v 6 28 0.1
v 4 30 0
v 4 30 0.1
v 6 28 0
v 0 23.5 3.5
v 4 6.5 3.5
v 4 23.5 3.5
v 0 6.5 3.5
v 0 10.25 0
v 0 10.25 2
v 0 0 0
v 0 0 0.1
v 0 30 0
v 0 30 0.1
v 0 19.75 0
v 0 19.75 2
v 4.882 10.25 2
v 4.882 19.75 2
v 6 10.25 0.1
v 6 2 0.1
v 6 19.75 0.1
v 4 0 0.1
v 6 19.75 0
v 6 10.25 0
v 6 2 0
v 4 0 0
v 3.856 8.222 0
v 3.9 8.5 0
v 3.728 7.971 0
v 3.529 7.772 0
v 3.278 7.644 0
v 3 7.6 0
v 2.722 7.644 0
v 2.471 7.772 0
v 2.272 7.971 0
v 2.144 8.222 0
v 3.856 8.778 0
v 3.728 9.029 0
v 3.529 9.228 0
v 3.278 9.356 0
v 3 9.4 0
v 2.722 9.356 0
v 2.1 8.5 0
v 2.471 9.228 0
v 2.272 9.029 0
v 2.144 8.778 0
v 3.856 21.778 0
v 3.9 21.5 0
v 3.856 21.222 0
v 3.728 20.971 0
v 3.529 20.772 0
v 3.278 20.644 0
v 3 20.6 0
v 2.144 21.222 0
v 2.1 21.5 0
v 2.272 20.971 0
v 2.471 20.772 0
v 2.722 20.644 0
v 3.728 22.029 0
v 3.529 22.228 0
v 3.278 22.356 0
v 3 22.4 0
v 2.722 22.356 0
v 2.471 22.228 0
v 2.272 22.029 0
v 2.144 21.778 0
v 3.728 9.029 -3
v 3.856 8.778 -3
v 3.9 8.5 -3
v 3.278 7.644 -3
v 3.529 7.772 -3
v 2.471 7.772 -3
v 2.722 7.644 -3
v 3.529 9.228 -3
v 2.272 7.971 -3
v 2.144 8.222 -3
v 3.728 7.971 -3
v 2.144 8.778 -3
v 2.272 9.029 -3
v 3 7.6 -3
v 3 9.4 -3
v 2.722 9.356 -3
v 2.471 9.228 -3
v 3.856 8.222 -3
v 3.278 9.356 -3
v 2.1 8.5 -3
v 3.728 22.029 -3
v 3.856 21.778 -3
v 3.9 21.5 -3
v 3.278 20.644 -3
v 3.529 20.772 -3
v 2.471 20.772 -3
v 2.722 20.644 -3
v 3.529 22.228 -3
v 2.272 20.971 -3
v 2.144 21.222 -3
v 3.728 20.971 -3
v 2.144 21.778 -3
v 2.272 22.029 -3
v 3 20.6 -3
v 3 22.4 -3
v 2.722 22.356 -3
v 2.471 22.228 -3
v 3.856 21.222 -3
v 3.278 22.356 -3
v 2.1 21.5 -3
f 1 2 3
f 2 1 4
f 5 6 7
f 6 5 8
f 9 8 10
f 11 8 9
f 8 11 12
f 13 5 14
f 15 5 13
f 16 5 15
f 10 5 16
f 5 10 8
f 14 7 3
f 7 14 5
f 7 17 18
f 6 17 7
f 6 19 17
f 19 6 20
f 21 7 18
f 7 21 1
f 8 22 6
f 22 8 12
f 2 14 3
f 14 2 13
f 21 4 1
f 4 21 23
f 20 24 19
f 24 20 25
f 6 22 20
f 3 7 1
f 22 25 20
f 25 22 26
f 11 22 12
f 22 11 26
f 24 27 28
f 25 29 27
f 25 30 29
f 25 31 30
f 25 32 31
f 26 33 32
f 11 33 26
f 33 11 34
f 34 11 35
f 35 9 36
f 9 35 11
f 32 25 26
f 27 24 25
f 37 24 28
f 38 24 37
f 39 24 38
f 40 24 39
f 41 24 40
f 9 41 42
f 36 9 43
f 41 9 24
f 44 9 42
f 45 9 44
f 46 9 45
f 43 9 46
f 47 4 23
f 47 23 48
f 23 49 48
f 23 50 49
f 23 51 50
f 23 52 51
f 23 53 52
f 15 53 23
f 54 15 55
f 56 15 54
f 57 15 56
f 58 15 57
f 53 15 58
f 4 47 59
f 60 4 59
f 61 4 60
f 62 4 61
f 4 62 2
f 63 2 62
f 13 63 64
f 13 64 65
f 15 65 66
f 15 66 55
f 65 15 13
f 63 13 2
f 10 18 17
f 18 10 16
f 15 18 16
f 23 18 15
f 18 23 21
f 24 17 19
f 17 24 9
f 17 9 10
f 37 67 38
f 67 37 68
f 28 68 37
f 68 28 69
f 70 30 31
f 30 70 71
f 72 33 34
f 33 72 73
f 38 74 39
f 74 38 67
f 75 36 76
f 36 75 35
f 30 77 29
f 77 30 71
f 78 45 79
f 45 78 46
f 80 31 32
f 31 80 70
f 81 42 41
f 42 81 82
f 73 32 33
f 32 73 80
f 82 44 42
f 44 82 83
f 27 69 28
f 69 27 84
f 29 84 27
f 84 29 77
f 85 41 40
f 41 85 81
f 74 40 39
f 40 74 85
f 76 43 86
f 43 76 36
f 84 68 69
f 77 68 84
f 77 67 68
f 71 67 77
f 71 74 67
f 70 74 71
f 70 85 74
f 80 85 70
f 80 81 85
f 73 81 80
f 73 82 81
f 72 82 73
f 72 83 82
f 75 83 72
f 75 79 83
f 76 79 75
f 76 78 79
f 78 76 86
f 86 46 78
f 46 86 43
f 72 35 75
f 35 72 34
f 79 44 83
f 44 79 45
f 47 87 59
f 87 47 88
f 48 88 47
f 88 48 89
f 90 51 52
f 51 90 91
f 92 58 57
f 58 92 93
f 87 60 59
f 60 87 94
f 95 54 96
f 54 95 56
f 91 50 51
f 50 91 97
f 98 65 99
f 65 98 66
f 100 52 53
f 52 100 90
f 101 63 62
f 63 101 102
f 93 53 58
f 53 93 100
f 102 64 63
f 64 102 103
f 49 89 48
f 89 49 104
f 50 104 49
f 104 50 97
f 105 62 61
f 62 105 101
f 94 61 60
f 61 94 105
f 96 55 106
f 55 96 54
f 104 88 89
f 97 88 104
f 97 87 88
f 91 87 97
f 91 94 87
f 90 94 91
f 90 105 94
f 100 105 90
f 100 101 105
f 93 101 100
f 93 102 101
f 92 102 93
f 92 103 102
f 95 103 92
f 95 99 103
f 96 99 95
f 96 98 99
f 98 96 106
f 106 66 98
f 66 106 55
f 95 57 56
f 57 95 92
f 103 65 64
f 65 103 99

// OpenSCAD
difference() {
    hull() {
        translate([0,6.5,0]) cube([4,17,3.5]);
        linear_extrude(height=0.1) {
            polygon(points=[[0,30],[4,30],[6,28],
            [6,2],[4,0],[0,0]]);
        }
    }
    translate([0,10.25,0]) cube([10,9.5,2]);
}

//mounting posts
translate([3,8.5,-3]) {
    cylinder(r=0.9,h=6.5,$fn=20);
}
translate([3,21.5,-3]) {
    cylinder(r=0.9,h=6.5,$fn=20);
}
